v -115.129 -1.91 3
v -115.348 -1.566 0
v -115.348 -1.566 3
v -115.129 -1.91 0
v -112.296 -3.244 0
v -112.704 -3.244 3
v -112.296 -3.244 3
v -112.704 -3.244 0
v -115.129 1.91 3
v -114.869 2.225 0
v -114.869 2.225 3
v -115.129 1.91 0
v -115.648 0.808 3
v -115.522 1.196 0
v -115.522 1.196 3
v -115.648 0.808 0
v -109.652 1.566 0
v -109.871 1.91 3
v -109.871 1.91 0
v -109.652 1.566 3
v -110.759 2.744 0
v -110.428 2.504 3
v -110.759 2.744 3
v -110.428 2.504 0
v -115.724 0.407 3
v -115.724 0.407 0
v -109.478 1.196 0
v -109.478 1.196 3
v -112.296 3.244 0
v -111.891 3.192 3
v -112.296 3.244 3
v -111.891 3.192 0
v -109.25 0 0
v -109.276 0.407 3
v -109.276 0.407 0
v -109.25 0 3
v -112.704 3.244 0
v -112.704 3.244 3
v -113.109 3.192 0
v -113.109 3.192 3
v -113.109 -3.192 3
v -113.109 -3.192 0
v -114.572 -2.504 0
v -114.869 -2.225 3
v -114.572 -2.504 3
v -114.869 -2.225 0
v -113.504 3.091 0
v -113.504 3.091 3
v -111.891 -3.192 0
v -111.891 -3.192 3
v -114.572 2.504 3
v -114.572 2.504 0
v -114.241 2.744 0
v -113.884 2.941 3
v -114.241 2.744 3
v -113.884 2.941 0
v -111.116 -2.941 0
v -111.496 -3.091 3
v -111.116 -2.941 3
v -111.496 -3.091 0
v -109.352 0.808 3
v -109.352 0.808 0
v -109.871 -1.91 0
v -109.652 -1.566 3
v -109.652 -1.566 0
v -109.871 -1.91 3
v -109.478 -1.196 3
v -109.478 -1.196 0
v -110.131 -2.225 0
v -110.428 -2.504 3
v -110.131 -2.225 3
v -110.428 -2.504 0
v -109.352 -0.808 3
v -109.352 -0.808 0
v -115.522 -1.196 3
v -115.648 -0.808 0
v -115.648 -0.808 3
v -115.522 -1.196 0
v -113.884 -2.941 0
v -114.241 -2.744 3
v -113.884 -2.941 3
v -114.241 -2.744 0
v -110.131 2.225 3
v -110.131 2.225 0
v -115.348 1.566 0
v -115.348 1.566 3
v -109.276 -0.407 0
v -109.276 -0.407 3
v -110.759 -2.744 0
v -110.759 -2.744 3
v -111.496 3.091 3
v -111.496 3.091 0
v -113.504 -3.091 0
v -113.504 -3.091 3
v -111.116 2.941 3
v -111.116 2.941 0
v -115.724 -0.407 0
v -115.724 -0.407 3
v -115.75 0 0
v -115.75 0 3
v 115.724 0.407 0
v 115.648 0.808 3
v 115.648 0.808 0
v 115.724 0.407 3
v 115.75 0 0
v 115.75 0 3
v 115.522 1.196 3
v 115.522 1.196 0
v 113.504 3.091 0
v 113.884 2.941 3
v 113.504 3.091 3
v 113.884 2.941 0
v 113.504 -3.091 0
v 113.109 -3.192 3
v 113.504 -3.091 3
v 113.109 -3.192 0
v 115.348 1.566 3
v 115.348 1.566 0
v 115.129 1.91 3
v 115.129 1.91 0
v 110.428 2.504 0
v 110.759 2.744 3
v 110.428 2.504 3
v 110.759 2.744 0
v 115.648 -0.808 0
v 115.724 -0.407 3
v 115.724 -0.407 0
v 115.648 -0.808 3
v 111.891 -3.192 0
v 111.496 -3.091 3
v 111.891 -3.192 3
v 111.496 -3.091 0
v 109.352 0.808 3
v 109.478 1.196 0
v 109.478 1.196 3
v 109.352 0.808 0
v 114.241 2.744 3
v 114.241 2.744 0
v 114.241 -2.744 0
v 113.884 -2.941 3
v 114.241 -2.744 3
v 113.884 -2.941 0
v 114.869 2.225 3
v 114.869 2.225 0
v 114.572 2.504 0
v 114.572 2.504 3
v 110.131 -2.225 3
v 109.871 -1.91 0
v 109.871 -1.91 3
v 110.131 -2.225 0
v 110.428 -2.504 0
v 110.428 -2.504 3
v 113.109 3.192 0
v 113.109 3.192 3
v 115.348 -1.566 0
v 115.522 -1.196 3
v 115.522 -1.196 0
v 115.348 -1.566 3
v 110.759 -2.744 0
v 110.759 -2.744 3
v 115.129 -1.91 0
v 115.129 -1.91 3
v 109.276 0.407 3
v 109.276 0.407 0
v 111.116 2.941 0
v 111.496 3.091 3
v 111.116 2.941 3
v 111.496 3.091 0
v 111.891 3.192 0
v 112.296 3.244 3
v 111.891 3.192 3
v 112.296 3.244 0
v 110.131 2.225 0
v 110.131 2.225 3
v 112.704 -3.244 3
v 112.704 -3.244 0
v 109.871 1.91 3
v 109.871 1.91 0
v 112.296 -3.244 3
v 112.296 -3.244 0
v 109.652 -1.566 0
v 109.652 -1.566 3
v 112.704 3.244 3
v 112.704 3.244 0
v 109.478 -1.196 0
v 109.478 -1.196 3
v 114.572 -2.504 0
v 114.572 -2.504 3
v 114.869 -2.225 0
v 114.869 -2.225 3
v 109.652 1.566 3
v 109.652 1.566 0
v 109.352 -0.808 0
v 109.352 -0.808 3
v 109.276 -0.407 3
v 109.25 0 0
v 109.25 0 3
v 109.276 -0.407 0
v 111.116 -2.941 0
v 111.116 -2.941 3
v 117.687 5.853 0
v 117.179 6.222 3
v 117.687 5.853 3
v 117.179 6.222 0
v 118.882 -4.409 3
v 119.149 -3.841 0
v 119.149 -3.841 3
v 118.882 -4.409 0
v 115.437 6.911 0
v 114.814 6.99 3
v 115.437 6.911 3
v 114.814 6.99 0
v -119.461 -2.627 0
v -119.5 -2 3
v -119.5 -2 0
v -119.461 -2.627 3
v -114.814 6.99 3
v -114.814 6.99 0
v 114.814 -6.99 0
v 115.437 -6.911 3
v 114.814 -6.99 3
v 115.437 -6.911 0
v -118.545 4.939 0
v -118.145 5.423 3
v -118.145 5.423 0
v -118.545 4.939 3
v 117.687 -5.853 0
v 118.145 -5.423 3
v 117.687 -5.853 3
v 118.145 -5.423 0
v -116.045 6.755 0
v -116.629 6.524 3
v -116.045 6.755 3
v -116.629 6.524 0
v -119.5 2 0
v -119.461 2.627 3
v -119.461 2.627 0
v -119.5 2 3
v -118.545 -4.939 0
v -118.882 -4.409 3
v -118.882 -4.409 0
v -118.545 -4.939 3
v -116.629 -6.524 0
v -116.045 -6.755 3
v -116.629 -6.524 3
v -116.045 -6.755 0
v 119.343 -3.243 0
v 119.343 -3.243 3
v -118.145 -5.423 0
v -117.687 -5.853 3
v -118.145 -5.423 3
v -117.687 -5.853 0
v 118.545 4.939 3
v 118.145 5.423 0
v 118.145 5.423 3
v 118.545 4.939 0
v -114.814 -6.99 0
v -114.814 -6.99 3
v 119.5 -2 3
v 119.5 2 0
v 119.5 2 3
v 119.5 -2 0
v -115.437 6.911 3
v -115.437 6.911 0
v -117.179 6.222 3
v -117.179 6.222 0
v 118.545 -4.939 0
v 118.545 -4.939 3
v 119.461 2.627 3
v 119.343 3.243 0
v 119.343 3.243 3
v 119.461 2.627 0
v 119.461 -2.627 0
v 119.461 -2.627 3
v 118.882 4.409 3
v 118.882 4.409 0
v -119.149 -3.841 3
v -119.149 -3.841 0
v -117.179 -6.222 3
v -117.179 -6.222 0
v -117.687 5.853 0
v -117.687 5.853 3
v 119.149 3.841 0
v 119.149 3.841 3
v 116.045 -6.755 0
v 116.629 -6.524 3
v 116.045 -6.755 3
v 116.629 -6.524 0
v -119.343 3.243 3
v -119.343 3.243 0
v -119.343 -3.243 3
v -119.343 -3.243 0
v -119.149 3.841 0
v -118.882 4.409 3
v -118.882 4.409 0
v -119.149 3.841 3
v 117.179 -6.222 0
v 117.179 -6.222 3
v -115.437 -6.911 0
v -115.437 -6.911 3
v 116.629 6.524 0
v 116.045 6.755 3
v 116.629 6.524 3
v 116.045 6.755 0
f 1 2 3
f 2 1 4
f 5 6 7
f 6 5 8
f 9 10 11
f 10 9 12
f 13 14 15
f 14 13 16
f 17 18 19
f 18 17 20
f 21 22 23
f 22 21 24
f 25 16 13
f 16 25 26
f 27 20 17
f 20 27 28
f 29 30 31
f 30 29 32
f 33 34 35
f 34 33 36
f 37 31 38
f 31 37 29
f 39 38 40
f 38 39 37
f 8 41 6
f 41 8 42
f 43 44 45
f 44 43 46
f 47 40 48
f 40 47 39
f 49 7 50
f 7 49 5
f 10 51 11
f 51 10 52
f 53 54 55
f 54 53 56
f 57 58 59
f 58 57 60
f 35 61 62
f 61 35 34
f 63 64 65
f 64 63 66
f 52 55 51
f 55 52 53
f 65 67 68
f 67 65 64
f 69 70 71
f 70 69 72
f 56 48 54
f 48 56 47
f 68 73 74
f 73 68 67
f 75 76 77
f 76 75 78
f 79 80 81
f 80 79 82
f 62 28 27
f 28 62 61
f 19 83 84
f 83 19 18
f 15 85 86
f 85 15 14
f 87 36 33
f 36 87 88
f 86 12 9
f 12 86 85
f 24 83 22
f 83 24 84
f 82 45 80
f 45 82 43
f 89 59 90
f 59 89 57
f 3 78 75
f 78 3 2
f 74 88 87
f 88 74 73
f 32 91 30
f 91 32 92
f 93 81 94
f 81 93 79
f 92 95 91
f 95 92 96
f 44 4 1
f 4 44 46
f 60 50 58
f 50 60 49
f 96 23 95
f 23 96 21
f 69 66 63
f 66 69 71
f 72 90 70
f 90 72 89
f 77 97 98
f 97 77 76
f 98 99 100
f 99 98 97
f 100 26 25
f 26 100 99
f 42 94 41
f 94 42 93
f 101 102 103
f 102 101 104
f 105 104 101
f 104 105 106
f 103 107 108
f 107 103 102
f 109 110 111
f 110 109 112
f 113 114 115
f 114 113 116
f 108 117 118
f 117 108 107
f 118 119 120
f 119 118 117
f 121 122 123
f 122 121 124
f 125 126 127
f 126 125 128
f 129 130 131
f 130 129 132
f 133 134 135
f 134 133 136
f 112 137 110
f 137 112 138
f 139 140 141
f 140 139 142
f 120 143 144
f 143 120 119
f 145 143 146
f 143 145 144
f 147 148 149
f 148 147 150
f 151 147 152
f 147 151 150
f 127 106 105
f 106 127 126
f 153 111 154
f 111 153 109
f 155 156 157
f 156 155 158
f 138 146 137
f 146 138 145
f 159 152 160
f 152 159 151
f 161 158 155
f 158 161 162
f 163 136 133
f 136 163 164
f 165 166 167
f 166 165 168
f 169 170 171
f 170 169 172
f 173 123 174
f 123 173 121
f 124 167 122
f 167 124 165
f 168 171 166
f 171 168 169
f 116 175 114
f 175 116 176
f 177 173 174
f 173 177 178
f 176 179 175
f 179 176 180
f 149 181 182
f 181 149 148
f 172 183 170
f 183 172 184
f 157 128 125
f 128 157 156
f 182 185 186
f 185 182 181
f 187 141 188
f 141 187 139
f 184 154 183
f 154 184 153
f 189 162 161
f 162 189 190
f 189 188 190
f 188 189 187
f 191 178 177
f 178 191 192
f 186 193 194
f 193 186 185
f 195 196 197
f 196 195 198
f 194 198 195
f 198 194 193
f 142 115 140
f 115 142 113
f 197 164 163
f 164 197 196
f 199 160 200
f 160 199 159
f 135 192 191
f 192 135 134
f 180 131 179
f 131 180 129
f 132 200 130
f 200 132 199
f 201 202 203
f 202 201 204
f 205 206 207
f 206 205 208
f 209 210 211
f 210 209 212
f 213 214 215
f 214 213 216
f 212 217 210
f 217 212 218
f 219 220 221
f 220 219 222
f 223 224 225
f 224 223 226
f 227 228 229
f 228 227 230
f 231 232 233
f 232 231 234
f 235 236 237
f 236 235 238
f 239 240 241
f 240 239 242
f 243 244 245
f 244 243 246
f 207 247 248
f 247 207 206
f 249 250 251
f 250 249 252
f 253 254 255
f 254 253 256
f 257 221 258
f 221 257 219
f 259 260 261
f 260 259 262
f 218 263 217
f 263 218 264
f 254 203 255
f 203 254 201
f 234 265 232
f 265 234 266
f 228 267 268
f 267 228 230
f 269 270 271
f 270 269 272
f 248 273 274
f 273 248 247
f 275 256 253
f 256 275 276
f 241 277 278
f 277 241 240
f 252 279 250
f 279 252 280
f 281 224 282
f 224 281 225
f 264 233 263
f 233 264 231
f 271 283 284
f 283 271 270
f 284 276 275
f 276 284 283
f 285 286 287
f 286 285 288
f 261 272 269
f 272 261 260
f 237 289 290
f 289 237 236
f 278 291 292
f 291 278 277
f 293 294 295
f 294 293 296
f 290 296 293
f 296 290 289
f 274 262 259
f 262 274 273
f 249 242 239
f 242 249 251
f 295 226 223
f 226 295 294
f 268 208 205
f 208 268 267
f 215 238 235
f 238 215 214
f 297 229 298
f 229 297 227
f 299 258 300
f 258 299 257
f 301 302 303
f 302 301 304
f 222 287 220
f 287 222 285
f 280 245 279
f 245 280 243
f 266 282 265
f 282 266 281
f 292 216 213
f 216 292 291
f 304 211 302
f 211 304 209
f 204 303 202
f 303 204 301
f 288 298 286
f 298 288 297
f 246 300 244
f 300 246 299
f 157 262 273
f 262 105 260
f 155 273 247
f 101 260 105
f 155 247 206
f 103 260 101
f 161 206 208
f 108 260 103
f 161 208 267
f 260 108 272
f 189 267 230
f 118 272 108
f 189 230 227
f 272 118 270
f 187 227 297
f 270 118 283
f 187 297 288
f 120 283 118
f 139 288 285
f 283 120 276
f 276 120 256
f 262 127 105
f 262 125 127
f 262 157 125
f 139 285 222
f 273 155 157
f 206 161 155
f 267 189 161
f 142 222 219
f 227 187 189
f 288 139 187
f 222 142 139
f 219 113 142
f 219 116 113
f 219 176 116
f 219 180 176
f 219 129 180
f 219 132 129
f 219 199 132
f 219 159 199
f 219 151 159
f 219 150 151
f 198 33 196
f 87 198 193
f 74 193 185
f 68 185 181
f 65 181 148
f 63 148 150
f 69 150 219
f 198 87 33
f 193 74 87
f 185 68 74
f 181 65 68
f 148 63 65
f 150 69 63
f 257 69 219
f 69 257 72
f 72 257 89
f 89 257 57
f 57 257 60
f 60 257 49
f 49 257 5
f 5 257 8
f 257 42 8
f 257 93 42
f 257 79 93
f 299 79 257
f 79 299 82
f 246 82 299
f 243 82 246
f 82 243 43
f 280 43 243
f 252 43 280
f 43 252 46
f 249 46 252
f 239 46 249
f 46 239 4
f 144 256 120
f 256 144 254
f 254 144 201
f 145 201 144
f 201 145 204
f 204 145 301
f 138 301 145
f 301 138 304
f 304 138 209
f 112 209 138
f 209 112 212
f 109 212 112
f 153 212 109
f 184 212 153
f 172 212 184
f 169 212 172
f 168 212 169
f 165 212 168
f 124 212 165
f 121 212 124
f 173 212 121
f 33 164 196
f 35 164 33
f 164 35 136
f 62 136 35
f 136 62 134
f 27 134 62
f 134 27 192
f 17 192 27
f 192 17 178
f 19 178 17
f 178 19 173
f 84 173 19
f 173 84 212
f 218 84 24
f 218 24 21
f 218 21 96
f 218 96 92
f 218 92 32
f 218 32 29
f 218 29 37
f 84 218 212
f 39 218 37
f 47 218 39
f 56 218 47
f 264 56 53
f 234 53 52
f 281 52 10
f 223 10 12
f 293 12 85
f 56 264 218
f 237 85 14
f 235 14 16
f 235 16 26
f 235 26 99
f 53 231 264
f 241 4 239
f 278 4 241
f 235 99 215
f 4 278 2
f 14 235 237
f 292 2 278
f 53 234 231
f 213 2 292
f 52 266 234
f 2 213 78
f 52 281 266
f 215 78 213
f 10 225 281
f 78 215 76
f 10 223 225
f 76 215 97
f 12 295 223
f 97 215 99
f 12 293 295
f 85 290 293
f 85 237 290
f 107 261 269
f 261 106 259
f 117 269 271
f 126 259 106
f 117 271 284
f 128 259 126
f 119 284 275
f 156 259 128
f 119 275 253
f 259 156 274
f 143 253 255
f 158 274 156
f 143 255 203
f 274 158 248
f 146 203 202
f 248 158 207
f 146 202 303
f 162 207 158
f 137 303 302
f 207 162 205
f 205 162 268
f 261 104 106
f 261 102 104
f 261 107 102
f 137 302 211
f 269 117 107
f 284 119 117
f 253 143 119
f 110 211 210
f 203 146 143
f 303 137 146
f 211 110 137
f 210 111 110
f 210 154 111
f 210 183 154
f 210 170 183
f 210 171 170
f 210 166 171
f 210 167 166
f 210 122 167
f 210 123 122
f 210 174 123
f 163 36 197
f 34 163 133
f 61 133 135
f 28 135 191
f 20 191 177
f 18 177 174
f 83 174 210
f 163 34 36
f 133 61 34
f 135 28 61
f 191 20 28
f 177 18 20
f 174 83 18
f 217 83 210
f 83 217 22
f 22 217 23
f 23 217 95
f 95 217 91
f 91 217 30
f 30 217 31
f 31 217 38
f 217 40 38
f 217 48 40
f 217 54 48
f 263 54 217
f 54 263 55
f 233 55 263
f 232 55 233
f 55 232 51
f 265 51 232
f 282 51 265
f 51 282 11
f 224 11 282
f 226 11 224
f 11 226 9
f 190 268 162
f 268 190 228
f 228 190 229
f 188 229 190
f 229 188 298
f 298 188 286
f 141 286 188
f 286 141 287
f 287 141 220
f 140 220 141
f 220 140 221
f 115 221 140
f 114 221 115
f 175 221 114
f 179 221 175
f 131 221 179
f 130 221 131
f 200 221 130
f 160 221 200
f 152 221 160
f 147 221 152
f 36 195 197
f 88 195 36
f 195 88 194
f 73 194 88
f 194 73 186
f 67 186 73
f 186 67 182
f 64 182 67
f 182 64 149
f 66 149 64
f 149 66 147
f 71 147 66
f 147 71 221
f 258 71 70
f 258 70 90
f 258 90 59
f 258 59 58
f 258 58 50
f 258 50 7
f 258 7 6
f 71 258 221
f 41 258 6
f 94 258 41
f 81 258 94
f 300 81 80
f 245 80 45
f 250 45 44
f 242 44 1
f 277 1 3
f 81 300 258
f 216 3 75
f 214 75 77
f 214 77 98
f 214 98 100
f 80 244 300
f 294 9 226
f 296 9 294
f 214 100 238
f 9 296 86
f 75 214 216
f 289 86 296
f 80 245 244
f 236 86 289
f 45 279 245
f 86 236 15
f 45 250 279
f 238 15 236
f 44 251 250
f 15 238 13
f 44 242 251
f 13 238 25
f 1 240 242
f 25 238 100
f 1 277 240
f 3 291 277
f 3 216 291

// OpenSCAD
$fn = 50;


difference() {
	union() {
		hull() {
			translate(v = [-114.5000000000, 2.0000000000, 0]) {
				cylinder(h = 3, r = 5);
			}
			translate(v = [114.5000000000, 2.0000000000, 0]) {
				cylinder(h = 3, r = 5);
			}
			translate(v = [-114.5000000000, -2.0000000000, 0]) {
				cylinder(h = 3, r = 5);
			}
			translate(v = [114.5000000000, -2.0000000000, 0]) {
				cylinder(h = 3, r = 5);
			}
		}
	}
	union() {
		translate(v = [-112.5000000000, 0.0000000000, -100.0000000000]) {
			cylinder(h = 200, r = 3.2500000000);
		}
		translate(v = [-112.5000000000, 0.0000000000, -100.0000000000]) {
			cylinder(h = 200, r = 3.2500000000);
		}
		translate(v = [112.5000000000, 0.0000000000, -100.0000000000]) {
			cylinder(h = 200, r = 3.2500000000);
		}
		translate(v = [112.5000000000, 0.0000000000, -100.0000000000]) {
			cylinder(h = 200, r = 3.2500000000);
		}
	}
}
